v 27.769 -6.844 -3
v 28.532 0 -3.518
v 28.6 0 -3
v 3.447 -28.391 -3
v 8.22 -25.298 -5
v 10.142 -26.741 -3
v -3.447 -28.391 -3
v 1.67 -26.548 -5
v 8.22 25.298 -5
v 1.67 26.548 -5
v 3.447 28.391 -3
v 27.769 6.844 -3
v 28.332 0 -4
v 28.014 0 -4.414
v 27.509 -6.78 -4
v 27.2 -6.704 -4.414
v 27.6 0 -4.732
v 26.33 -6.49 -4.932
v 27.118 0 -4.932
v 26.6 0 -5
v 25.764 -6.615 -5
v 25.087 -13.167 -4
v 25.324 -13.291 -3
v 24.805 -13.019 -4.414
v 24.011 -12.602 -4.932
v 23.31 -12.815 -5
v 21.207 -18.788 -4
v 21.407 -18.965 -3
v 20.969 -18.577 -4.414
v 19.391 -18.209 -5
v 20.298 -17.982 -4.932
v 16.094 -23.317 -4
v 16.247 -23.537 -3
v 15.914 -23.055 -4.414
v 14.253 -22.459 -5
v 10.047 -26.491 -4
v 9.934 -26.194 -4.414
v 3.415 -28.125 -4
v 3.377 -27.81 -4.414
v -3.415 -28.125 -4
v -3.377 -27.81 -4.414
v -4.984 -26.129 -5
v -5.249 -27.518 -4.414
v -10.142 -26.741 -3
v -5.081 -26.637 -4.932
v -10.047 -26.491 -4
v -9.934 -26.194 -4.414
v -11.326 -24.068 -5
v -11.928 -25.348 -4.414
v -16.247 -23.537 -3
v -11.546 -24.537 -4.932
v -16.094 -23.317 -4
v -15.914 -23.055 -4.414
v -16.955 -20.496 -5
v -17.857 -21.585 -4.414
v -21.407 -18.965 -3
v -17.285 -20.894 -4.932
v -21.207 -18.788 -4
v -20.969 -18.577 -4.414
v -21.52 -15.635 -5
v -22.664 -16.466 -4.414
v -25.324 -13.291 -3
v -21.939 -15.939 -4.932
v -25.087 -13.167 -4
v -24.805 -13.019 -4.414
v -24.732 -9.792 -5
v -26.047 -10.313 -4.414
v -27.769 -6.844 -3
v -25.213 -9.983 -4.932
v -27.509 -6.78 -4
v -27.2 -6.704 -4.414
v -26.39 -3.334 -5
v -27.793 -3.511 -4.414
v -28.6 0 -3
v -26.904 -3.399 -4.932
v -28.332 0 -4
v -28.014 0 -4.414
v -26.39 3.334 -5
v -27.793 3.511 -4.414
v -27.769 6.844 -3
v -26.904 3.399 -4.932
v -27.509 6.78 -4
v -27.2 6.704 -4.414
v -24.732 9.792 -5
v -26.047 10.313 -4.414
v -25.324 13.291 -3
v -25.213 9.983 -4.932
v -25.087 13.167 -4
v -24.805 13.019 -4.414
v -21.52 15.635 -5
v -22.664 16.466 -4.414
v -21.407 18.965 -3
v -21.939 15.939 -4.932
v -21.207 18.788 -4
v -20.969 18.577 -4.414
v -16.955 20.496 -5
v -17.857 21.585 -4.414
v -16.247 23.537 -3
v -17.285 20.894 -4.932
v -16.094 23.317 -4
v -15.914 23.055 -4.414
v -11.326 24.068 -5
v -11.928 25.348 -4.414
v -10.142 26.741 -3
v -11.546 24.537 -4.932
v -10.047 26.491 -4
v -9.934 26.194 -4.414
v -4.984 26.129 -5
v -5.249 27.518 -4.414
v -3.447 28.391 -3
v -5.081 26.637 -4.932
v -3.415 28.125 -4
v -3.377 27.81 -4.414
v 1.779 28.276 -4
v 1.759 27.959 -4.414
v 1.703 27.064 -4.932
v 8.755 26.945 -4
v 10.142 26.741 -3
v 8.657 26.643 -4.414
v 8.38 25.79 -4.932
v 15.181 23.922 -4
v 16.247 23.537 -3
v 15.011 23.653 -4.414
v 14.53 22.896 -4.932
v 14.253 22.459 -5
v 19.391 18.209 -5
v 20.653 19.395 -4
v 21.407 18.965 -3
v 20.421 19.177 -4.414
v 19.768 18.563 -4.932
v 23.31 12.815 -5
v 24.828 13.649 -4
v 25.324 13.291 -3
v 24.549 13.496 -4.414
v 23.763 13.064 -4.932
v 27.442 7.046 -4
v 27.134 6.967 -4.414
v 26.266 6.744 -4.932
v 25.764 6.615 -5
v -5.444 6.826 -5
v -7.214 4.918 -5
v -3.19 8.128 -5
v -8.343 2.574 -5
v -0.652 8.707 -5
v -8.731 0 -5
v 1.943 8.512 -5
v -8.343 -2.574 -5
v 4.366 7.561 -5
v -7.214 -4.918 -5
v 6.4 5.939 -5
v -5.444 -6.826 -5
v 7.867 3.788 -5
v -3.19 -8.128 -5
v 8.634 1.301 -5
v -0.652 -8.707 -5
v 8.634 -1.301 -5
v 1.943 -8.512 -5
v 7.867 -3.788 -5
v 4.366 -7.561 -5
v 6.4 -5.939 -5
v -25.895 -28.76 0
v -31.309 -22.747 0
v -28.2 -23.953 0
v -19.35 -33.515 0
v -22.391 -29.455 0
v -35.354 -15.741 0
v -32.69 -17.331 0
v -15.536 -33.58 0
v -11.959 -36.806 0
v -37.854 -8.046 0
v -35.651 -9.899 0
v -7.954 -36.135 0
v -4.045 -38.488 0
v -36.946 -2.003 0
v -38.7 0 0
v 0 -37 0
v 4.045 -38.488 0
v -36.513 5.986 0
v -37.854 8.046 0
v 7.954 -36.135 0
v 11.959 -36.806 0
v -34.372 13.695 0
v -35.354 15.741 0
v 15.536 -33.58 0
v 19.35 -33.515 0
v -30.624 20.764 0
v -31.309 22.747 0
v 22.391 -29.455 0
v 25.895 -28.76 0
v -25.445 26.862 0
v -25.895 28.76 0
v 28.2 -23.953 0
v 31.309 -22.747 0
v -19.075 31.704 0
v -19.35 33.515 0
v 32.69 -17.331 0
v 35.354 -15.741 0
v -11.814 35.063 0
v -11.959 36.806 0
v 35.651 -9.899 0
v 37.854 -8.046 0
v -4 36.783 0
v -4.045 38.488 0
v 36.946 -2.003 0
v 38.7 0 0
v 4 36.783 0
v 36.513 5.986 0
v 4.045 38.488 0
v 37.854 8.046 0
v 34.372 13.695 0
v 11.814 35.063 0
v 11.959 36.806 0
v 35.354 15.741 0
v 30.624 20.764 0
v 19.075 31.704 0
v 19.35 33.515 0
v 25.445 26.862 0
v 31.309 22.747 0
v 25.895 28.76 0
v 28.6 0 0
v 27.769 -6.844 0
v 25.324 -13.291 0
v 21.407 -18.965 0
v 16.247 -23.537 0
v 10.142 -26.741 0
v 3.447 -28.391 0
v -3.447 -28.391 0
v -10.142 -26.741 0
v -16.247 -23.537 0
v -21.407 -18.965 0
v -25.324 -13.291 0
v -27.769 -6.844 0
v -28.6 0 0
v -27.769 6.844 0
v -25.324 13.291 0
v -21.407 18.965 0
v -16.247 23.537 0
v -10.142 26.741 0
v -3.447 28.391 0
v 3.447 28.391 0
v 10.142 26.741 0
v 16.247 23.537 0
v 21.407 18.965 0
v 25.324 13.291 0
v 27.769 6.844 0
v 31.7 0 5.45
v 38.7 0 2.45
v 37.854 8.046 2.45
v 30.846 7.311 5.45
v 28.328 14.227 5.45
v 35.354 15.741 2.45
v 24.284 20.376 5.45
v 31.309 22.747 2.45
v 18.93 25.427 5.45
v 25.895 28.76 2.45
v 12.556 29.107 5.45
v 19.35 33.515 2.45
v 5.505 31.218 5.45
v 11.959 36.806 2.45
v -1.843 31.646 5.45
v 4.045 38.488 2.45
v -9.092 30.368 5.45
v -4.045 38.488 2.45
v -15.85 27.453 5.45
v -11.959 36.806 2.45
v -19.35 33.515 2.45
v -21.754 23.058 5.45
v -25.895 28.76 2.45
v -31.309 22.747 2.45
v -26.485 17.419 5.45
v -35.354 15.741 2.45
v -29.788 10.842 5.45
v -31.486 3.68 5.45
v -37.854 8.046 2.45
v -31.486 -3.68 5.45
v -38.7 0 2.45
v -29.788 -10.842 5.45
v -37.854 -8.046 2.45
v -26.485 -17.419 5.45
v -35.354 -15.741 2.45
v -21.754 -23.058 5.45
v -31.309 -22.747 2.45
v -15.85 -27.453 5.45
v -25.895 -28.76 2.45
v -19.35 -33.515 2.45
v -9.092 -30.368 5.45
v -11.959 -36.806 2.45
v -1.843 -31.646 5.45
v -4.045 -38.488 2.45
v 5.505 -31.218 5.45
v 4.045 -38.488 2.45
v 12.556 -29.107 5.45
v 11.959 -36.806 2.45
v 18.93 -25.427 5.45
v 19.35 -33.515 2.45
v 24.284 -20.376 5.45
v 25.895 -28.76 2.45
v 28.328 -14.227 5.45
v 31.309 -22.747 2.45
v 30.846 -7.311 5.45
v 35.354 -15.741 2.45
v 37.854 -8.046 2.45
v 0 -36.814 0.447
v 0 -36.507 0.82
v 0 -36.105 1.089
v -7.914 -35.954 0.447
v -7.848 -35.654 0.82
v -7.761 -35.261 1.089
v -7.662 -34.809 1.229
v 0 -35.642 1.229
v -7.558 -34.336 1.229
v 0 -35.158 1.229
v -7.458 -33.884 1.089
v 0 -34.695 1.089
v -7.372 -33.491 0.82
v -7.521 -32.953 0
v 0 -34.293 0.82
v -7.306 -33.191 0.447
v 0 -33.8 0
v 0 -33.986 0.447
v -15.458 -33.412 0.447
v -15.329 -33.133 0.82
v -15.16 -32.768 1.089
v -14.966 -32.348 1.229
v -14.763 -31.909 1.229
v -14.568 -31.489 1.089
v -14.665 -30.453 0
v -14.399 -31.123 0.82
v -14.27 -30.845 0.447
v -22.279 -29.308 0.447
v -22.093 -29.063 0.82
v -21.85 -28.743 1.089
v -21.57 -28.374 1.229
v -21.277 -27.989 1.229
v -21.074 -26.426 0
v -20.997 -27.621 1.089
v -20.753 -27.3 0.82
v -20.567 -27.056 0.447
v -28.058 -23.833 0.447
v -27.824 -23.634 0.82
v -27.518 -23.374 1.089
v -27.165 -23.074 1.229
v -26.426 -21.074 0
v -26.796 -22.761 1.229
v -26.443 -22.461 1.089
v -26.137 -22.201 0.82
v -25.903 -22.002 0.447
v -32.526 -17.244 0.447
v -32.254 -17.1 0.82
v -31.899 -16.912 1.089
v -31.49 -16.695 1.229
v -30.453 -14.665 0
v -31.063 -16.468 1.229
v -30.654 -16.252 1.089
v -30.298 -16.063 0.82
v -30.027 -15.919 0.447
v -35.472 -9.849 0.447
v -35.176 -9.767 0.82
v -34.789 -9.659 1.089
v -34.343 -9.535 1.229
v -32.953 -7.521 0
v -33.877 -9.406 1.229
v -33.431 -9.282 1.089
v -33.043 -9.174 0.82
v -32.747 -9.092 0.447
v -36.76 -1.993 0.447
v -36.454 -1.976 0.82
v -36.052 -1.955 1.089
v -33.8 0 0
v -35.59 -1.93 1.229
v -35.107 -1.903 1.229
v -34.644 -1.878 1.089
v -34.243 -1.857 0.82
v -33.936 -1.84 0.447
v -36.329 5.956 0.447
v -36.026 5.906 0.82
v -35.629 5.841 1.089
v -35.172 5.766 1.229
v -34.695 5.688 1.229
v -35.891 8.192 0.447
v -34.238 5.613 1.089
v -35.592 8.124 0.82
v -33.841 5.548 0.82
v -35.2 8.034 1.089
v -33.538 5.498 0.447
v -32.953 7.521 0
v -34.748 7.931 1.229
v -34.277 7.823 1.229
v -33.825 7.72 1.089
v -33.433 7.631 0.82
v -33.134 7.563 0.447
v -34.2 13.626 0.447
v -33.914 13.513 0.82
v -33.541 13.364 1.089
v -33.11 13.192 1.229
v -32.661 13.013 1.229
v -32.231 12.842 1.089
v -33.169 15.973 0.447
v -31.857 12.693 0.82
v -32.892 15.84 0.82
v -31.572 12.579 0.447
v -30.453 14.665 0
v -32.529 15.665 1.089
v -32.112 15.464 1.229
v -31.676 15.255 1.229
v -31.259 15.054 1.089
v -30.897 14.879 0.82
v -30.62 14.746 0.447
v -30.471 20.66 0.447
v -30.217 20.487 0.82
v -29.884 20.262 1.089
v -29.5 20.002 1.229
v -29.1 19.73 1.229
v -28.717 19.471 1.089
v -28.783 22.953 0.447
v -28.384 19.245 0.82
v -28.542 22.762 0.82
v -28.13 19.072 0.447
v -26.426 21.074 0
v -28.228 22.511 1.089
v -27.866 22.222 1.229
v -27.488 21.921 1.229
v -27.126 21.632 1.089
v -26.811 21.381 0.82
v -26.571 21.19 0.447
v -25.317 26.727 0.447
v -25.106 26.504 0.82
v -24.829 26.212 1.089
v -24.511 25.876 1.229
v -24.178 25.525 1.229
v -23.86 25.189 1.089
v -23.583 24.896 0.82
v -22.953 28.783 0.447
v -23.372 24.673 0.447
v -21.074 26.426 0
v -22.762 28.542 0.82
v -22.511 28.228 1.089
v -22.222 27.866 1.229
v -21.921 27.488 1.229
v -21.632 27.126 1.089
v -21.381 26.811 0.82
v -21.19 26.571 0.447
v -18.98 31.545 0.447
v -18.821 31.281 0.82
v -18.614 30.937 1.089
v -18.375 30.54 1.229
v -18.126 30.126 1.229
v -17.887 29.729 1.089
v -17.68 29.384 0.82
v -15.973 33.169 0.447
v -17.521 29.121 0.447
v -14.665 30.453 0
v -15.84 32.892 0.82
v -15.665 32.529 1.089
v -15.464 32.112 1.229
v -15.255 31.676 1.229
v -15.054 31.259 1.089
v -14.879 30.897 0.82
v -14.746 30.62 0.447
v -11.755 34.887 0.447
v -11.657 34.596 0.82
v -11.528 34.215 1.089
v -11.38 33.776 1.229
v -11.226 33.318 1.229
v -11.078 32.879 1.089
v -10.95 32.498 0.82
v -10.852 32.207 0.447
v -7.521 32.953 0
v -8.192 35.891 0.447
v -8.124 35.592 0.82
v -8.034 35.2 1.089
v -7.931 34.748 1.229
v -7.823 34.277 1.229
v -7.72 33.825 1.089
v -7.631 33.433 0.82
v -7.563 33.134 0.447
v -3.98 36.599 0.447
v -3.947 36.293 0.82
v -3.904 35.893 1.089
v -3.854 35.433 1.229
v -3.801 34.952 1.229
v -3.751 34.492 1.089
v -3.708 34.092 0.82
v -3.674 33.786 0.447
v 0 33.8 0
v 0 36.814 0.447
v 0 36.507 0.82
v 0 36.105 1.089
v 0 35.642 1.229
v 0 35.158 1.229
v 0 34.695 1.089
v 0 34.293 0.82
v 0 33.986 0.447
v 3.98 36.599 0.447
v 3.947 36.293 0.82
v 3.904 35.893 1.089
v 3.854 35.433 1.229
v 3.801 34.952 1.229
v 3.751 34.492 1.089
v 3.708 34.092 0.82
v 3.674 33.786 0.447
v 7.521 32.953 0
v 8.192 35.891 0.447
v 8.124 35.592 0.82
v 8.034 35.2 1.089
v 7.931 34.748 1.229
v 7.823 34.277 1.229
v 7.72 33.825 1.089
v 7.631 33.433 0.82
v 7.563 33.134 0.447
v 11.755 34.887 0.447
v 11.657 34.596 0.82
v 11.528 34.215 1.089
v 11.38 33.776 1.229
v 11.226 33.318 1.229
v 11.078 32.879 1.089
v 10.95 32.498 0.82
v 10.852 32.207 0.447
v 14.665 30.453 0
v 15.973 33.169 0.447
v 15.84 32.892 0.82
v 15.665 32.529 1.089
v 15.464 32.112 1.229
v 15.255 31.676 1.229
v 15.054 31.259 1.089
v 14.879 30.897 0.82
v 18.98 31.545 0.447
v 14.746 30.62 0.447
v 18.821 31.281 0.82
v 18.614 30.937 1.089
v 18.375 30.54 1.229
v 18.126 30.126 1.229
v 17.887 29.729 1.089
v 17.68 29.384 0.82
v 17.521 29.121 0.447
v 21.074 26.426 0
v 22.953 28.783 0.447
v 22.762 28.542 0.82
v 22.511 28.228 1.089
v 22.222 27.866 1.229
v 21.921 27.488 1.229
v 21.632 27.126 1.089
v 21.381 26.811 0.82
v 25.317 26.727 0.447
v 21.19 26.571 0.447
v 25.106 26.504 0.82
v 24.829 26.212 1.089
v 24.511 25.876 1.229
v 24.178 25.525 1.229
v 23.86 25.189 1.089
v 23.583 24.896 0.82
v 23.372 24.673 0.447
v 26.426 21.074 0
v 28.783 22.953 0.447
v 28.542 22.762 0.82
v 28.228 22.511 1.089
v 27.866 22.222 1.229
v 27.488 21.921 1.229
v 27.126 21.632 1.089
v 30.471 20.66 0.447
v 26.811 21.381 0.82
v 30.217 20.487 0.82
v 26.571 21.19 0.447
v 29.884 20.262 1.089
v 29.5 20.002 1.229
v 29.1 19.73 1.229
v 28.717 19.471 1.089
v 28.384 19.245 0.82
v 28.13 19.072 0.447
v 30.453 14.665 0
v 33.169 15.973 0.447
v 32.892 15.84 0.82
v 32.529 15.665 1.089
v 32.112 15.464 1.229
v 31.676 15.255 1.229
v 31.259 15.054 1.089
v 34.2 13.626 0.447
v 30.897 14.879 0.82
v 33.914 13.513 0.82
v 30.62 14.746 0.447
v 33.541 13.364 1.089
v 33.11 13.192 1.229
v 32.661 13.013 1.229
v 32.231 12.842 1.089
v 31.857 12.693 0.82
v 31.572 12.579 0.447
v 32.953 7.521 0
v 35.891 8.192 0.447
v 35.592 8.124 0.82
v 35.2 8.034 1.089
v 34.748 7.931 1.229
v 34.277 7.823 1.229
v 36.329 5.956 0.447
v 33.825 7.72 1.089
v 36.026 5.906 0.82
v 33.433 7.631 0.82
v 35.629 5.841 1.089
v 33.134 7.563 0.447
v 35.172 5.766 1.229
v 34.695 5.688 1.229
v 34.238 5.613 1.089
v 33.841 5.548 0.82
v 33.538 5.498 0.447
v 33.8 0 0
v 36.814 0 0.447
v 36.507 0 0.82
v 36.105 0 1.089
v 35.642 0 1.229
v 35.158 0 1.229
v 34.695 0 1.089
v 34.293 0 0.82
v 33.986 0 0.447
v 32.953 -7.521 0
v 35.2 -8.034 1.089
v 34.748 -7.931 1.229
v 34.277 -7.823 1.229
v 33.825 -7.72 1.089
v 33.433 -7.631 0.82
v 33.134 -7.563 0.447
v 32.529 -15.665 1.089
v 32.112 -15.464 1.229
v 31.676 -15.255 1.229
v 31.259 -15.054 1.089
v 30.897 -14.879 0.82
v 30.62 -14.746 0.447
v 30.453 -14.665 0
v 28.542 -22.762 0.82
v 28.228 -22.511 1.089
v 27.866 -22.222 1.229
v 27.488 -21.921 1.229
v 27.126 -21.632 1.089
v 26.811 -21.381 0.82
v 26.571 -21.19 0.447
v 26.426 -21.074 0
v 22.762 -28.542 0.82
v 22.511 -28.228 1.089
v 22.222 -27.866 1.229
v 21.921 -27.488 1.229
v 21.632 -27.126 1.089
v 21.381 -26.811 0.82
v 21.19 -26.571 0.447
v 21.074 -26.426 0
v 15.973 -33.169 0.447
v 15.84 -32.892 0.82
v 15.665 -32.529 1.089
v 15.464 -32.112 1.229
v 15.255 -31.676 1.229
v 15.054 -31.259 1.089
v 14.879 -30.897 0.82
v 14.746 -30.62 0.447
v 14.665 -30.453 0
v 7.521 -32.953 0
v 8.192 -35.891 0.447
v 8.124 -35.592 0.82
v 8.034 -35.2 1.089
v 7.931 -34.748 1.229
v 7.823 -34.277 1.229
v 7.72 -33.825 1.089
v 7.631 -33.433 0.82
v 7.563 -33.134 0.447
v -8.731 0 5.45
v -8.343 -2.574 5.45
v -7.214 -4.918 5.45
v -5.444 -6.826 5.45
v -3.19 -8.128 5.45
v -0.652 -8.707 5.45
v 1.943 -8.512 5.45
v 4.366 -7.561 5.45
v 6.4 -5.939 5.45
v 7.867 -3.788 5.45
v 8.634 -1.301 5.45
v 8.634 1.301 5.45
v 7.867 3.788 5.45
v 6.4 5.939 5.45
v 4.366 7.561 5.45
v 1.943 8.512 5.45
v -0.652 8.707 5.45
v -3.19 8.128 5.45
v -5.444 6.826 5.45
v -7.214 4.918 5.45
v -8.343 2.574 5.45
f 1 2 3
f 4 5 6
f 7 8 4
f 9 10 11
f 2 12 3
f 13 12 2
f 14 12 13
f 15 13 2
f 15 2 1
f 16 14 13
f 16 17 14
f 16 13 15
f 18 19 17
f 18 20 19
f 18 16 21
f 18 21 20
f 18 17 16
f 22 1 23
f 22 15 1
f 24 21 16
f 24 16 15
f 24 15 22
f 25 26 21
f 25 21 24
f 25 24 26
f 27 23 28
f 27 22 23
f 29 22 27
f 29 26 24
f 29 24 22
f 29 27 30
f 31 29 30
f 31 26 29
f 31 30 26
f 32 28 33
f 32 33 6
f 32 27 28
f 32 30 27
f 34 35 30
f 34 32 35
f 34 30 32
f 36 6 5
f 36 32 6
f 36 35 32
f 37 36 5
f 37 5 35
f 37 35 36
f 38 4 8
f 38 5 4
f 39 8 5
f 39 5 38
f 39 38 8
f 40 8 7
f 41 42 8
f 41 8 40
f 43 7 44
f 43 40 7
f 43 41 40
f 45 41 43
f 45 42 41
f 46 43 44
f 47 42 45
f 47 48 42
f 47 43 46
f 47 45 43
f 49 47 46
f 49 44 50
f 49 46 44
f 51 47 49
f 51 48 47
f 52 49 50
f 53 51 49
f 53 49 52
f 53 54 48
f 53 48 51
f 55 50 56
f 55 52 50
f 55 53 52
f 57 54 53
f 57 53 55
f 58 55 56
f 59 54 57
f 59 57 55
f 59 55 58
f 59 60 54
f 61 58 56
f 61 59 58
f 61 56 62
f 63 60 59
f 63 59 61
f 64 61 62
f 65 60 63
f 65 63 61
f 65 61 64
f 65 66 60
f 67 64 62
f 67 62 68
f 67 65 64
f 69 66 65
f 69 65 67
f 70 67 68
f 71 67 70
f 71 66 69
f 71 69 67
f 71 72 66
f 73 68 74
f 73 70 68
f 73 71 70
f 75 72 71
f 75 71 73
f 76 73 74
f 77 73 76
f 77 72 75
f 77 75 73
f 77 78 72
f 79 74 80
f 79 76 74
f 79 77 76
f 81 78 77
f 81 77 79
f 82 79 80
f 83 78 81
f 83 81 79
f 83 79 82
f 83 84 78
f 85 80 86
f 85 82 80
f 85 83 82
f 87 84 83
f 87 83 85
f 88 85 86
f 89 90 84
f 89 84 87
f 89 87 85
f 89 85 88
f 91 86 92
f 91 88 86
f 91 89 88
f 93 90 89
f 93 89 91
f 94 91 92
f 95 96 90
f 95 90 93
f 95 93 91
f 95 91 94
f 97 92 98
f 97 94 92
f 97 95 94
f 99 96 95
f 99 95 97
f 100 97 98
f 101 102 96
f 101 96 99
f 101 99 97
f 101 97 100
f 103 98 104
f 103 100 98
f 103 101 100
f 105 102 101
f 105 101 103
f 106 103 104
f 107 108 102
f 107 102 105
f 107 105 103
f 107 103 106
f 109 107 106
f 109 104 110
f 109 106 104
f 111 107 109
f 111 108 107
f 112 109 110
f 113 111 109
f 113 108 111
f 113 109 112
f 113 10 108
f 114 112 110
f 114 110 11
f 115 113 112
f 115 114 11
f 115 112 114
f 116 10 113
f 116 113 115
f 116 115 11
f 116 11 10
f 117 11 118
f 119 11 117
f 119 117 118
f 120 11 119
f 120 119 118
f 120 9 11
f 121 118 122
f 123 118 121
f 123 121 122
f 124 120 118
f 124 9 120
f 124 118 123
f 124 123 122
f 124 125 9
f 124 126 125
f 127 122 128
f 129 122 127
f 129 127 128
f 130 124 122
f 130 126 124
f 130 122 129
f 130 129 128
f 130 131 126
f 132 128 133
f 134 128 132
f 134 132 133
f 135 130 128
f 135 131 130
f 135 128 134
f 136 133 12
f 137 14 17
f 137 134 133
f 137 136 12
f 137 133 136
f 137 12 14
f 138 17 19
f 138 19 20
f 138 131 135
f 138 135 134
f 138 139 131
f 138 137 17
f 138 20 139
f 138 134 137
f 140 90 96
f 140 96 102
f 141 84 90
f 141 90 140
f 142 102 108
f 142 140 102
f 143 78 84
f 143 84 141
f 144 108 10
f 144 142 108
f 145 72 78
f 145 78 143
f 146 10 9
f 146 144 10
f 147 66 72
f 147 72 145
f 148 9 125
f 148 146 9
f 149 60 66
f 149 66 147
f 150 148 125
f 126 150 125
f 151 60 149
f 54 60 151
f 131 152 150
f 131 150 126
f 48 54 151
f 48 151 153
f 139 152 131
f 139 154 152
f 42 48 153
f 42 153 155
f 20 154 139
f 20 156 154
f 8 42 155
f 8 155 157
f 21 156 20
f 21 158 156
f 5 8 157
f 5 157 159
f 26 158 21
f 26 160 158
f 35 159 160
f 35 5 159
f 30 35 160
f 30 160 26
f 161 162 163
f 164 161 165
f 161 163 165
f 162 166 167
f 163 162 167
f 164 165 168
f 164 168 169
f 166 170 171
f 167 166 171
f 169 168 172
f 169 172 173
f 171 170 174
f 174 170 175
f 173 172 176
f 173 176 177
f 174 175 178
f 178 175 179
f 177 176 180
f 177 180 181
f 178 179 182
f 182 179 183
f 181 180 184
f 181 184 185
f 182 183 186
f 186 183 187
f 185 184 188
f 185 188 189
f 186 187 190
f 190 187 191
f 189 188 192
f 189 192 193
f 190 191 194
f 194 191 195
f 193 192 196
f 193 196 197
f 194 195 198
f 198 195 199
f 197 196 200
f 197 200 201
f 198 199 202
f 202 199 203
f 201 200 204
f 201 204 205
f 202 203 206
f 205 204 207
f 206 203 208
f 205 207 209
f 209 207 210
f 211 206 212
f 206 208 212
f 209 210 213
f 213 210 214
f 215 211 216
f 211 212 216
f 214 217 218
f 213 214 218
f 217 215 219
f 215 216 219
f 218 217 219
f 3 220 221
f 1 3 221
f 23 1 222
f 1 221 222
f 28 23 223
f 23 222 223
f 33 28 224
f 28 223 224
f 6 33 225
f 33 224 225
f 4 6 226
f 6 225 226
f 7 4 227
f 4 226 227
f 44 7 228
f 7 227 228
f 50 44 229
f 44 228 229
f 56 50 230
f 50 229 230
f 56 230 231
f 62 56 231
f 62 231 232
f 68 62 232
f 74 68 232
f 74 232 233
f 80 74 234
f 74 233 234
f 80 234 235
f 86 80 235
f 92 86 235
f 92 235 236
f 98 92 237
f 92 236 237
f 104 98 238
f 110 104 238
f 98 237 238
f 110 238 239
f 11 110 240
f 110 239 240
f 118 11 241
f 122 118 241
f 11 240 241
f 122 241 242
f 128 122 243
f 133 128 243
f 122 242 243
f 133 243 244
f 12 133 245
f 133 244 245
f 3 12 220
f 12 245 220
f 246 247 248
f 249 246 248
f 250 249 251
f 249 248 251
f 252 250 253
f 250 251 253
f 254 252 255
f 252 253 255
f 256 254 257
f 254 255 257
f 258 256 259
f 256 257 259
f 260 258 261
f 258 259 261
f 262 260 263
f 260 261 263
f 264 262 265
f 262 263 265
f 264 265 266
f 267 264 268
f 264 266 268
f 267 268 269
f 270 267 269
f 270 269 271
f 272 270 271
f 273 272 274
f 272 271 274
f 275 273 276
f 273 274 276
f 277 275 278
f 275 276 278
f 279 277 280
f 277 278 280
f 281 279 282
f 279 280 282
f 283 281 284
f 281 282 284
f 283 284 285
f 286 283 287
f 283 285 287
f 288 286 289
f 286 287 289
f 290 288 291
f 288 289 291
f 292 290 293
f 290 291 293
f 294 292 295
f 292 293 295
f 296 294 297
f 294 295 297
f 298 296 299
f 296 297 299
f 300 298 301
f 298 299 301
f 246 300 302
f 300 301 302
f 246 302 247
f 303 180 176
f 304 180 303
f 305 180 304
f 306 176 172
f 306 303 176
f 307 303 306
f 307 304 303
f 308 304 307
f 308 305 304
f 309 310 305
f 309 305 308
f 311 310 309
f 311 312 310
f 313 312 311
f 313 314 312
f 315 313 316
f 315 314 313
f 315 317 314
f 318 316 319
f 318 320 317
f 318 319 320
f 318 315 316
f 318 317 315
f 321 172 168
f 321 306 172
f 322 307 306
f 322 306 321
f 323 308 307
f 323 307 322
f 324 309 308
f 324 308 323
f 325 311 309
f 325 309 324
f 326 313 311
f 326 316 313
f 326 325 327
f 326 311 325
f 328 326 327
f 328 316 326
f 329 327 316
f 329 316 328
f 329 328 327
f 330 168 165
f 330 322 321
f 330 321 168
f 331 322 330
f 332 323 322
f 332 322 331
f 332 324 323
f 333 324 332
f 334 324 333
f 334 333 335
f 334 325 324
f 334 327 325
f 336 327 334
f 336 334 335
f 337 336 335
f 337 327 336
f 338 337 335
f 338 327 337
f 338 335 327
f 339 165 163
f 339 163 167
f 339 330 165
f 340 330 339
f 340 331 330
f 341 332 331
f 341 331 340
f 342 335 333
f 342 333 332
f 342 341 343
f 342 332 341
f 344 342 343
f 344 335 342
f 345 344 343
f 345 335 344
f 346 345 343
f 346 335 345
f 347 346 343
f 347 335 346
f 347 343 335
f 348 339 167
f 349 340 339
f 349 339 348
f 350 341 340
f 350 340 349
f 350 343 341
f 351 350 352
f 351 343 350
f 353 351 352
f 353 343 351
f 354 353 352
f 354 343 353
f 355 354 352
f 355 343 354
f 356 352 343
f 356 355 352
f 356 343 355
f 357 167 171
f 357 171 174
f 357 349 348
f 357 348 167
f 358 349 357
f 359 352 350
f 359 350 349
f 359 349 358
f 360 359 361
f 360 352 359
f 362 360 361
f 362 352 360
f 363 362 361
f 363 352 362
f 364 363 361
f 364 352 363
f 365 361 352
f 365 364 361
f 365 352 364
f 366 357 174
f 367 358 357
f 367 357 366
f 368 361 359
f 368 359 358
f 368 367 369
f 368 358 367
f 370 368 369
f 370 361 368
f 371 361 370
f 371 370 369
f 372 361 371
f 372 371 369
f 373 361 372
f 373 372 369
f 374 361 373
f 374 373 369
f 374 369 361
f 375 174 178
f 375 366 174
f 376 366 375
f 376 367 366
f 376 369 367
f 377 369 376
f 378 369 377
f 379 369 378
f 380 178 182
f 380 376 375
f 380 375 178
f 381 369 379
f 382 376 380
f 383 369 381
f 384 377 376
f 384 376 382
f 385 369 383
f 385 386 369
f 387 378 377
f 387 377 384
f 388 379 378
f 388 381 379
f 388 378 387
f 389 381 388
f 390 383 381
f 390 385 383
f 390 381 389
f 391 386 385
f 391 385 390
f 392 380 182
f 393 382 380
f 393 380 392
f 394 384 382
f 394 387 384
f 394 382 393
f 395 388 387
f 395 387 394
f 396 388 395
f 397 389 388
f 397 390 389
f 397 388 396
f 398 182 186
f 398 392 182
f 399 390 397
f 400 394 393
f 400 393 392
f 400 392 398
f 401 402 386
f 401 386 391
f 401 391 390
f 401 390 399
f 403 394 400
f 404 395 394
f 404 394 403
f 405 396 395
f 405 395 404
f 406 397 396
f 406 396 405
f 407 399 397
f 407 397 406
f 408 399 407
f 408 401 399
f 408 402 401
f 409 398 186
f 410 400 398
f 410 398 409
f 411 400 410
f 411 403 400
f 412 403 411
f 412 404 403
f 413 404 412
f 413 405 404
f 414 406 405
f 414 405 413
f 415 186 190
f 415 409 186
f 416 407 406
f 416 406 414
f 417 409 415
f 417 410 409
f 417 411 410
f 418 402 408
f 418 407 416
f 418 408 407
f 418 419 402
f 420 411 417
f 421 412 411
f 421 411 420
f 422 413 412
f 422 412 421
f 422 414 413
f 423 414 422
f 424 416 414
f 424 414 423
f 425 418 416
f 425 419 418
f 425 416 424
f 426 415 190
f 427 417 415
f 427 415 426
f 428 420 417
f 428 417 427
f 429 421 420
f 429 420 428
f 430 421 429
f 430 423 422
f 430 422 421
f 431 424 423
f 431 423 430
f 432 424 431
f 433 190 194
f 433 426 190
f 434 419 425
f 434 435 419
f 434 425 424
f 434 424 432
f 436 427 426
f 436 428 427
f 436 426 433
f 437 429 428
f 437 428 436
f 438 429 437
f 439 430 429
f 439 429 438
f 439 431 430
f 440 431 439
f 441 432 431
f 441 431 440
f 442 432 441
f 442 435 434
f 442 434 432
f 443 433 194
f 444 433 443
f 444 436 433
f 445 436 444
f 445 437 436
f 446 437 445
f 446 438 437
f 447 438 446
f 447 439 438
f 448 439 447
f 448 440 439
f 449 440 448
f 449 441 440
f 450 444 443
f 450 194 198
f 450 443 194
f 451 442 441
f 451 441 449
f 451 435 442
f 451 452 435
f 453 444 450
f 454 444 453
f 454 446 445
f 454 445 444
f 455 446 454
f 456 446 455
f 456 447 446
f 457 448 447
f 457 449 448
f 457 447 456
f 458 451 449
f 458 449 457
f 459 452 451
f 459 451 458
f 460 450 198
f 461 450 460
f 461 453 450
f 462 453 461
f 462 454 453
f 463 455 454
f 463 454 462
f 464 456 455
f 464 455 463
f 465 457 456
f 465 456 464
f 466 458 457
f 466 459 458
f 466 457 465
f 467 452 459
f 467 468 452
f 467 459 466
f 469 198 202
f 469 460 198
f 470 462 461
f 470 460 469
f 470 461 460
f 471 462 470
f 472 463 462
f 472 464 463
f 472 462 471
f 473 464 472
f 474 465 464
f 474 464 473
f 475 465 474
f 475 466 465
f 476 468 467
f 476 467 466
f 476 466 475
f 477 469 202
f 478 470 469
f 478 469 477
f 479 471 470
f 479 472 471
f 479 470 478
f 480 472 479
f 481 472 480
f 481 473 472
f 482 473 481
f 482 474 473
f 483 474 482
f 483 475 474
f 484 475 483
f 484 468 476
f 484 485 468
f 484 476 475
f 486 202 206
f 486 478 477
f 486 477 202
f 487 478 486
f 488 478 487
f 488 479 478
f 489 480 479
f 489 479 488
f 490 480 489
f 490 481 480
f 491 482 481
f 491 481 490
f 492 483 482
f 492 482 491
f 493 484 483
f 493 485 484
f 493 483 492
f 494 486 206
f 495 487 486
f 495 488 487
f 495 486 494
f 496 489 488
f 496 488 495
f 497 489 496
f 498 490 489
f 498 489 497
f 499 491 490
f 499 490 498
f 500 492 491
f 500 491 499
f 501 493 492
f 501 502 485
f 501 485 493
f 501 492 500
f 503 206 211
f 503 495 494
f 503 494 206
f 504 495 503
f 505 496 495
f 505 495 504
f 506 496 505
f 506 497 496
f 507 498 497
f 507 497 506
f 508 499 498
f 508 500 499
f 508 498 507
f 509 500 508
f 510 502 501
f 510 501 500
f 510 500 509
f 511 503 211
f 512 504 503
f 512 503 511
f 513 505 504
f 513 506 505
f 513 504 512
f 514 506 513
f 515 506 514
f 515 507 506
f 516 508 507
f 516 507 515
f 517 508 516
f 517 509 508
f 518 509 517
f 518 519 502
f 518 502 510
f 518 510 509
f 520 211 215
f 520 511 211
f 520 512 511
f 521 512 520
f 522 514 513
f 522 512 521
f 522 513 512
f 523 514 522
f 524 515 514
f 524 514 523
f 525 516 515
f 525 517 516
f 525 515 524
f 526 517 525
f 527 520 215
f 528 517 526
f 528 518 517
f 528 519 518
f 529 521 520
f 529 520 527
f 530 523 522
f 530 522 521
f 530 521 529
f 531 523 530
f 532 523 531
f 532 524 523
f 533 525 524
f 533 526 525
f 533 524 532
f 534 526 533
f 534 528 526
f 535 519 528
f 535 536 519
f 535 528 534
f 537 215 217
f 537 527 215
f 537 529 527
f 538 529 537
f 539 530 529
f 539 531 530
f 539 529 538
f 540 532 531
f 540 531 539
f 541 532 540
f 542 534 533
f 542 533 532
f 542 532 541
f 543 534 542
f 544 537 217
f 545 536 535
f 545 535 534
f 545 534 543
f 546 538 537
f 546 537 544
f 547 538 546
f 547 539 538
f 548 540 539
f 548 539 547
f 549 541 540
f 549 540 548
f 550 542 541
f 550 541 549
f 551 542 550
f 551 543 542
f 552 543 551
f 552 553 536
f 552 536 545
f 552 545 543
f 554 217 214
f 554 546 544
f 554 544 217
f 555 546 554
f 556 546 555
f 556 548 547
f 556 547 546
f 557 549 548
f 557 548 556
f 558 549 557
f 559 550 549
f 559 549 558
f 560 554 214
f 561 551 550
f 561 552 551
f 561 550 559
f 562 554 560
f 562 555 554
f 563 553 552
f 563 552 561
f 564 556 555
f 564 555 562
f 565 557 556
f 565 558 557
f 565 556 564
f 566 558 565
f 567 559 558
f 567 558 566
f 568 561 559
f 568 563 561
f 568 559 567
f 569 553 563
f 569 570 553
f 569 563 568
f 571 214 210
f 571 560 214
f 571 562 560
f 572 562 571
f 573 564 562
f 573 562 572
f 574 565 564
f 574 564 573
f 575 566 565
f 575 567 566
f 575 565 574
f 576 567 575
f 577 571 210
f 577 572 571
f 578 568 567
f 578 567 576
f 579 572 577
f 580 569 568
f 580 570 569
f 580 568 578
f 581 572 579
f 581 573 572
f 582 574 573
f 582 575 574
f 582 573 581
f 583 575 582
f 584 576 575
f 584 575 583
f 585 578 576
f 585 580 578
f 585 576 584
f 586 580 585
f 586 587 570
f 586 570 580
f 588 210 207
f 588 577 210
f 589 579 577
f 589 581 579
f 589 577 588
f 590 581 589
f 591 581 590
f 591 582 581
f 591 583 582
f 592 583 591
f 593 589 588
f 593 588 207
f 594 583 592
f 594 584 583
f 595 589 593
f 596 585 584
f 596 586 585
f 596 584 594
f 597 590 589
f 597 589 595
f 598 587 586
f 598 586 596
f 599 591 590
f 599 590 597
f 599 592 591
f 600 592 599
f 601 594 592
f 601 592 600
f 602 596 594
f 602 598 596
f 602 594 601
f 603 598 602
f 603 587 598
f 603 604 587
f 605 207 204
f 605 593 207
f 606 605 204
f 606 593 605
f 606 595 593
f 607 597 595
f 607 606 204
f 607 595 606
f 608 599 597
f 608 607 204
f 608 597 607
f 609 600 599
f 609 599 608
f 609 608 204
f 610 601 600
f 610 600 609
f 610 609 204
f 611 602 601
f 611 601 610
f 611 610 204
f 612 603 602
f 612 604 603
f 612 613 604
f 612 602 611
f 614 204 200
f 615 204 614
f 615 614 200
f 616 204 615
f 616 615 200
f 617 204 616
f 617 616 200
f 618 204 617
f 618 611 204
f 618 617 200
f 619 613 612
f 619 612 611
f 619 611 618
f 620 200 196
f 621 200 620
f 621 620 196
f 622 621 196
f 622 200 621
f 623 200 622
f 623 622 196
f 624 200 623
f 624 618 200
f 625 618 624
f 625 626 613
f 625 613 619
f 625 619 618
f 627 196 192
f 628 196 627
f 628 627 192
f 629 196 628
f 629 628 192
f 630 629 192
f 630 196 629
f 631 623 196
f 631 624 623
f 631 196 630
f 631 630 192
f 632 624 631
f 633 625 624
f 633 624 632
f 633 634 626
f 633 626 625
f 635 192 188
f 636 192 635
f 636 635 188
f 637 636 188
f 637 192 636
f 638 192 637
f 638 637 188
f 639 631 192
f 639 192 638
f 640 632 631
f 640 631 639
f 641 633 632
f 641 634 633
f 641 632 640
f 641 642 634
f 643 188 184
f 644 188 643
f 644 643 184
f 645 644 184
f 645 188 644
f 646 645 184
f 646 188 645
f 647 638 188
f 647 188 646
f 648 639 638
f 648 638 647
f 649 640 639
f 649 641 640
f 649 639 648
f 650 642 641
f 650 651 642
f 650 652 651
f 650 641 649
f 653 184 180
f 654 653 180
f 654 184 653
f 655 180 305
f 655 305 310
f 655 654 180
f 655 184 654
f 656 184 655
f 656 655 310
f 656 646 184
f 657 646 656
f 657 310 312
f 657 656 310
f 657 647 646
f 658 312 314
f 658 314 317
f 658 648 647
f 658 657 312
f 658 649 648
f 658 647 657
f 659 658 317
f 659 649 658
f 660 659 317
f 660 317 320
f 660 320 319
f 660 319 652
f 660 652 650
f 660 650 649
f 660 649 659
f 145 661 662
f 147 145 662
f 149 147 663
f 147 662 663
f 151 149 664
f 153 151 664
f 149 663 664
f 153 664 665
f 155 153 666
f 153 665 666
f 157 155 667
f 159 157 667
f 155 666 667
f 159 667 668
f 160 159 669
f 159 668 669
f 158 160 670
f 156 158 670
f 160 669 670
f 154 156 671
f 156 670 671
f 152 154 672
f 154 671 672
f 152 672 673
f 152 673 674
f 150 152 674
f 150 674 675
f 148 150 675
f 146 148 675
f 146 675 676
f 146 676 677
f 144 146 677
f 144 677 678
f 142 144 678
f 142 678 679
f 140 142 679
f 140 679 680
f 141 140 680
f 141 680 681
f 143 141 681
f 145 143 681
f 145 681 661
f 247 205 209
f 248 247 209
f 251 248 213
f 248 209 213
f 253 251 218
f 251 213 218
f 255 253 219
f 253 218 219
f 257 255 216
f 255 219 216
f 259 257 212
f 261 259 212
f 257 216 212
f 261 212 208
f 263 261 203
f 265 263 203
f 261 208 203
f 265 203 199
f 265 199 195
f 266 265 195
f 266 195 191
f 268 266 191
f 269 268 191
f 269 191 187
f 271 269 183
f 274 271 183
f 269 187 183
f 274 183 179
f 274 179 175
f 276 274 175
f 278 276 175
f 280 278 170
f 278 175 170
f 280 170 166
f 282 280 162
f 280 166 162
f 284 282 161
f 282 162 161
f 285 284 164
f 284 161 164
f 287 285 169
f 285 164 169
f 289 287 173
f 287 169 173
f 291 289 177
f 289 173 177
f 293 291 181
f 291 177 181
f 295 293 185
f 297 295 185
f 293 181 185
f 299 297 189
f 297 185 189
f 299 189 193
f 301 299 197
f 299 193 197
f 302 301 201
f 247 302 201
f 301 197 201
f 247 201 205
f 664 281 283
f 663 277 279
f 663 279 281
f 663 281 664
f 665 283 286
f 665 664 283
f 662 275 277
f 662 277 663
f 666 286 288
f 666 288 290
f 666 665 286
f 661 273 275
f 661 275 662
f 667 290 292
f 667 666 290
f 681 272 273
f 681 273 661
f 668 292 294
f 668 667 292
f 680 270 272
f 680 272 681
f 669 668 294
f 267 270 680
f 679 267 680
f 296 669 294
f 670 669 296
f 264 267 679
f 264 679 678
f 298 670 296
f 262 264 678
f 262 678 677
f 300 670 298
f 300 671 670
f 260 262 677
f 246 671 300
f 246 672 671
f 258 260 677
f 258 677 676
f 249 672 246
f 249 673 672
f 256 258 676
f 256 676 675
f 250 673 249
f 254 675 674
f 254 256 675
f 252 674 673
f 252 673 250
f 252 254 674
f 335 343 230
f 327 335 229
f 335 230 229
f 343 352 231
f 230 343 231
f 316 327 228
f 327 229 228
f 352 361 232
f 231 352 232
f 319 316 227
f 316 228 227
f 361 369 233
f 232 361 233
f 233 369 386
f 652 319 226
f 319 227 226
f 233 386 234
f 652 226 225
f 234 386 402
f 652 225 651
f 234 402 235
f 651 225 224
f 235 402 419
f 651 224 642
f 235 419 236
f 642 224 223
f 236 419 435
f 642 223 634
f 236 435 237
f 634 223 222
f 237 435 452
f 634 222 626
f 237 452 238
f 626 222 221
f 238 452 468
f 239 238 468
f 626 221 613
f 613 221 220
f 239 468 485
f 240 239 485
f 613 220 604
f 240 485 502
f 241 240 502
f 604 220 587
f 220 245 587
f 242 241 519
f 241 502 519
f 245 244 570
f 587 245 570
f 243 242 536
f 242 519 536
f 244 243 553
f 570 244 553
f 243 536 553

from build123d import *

# Parameters (mm, degrees)
F0_R     = 38.7
F1_DEPTH = 5.45
F2_R     = 28.6
F3_DEPTH = 5
F4_SIZE2 = 3
F4_SIZE  = 7
F5_R     = 2
F12_D    = 17.4625


with BuildPart() as f1:
    # F0 (on Top) → F1 (new body)
    with BuildSketch(Plane.XY):
        Circle(F0_R)
    extrude(amount=F1_DEPTH)

    # F2 (on face) → F3 (join)
    with BuildSketch(Plane(origin=(0, 0, 0), x_dir=(1, 0, 0), z_dir=(0, 0, -1))):
        Circle(F2_R)
    extrude(amount=F3_DEPTH)

    # F4
    f4_edges = [f1.edges().sort_by_distance(p)[0] for p in [
        (-38.7, 0, 5.45),
    ]]
    f4_side = f1.faces().sort_by_distance((0, 0, 5.45))[0]
    chamfer(f4_edges, length=F4_SIZE, length2=F4_SIZE2, reference=f4_side)

    # F5
    f5_edges = [f1.edges().sort_by_distance(p)[0] for p in [
        (-28.6, 0, -5),
    ]]
    fillet(f5_edges, radius=F5_R)

    # F9 (on 3pt) → F11 (revolve, cut)
    with BuildSketch(Plane(origin=(0, 0, 0), x_dir=(0, -1, 0), z_dir=(-1, 0, 0))):
        with BuildLine():
            Line((33.8, 0), (37, 0))
            ThreePointArc((37, 0), (35.4, 1.2468871126), (33.8, 0))
        make_face()
    revolve(axis=Axis((0, 0, 7.6663349755), (0, 0, -1)), mode=Mode.SUBTRACT)

    # F12 (through all)
    with Locations(Plane(origin=(0, 0, -5), x_dir=(1, 0, 0), z_dir=(0, 0, -1))):
        with Locations((0, 0)):
            Hole(F12_D / 2)


solid = f1.part
